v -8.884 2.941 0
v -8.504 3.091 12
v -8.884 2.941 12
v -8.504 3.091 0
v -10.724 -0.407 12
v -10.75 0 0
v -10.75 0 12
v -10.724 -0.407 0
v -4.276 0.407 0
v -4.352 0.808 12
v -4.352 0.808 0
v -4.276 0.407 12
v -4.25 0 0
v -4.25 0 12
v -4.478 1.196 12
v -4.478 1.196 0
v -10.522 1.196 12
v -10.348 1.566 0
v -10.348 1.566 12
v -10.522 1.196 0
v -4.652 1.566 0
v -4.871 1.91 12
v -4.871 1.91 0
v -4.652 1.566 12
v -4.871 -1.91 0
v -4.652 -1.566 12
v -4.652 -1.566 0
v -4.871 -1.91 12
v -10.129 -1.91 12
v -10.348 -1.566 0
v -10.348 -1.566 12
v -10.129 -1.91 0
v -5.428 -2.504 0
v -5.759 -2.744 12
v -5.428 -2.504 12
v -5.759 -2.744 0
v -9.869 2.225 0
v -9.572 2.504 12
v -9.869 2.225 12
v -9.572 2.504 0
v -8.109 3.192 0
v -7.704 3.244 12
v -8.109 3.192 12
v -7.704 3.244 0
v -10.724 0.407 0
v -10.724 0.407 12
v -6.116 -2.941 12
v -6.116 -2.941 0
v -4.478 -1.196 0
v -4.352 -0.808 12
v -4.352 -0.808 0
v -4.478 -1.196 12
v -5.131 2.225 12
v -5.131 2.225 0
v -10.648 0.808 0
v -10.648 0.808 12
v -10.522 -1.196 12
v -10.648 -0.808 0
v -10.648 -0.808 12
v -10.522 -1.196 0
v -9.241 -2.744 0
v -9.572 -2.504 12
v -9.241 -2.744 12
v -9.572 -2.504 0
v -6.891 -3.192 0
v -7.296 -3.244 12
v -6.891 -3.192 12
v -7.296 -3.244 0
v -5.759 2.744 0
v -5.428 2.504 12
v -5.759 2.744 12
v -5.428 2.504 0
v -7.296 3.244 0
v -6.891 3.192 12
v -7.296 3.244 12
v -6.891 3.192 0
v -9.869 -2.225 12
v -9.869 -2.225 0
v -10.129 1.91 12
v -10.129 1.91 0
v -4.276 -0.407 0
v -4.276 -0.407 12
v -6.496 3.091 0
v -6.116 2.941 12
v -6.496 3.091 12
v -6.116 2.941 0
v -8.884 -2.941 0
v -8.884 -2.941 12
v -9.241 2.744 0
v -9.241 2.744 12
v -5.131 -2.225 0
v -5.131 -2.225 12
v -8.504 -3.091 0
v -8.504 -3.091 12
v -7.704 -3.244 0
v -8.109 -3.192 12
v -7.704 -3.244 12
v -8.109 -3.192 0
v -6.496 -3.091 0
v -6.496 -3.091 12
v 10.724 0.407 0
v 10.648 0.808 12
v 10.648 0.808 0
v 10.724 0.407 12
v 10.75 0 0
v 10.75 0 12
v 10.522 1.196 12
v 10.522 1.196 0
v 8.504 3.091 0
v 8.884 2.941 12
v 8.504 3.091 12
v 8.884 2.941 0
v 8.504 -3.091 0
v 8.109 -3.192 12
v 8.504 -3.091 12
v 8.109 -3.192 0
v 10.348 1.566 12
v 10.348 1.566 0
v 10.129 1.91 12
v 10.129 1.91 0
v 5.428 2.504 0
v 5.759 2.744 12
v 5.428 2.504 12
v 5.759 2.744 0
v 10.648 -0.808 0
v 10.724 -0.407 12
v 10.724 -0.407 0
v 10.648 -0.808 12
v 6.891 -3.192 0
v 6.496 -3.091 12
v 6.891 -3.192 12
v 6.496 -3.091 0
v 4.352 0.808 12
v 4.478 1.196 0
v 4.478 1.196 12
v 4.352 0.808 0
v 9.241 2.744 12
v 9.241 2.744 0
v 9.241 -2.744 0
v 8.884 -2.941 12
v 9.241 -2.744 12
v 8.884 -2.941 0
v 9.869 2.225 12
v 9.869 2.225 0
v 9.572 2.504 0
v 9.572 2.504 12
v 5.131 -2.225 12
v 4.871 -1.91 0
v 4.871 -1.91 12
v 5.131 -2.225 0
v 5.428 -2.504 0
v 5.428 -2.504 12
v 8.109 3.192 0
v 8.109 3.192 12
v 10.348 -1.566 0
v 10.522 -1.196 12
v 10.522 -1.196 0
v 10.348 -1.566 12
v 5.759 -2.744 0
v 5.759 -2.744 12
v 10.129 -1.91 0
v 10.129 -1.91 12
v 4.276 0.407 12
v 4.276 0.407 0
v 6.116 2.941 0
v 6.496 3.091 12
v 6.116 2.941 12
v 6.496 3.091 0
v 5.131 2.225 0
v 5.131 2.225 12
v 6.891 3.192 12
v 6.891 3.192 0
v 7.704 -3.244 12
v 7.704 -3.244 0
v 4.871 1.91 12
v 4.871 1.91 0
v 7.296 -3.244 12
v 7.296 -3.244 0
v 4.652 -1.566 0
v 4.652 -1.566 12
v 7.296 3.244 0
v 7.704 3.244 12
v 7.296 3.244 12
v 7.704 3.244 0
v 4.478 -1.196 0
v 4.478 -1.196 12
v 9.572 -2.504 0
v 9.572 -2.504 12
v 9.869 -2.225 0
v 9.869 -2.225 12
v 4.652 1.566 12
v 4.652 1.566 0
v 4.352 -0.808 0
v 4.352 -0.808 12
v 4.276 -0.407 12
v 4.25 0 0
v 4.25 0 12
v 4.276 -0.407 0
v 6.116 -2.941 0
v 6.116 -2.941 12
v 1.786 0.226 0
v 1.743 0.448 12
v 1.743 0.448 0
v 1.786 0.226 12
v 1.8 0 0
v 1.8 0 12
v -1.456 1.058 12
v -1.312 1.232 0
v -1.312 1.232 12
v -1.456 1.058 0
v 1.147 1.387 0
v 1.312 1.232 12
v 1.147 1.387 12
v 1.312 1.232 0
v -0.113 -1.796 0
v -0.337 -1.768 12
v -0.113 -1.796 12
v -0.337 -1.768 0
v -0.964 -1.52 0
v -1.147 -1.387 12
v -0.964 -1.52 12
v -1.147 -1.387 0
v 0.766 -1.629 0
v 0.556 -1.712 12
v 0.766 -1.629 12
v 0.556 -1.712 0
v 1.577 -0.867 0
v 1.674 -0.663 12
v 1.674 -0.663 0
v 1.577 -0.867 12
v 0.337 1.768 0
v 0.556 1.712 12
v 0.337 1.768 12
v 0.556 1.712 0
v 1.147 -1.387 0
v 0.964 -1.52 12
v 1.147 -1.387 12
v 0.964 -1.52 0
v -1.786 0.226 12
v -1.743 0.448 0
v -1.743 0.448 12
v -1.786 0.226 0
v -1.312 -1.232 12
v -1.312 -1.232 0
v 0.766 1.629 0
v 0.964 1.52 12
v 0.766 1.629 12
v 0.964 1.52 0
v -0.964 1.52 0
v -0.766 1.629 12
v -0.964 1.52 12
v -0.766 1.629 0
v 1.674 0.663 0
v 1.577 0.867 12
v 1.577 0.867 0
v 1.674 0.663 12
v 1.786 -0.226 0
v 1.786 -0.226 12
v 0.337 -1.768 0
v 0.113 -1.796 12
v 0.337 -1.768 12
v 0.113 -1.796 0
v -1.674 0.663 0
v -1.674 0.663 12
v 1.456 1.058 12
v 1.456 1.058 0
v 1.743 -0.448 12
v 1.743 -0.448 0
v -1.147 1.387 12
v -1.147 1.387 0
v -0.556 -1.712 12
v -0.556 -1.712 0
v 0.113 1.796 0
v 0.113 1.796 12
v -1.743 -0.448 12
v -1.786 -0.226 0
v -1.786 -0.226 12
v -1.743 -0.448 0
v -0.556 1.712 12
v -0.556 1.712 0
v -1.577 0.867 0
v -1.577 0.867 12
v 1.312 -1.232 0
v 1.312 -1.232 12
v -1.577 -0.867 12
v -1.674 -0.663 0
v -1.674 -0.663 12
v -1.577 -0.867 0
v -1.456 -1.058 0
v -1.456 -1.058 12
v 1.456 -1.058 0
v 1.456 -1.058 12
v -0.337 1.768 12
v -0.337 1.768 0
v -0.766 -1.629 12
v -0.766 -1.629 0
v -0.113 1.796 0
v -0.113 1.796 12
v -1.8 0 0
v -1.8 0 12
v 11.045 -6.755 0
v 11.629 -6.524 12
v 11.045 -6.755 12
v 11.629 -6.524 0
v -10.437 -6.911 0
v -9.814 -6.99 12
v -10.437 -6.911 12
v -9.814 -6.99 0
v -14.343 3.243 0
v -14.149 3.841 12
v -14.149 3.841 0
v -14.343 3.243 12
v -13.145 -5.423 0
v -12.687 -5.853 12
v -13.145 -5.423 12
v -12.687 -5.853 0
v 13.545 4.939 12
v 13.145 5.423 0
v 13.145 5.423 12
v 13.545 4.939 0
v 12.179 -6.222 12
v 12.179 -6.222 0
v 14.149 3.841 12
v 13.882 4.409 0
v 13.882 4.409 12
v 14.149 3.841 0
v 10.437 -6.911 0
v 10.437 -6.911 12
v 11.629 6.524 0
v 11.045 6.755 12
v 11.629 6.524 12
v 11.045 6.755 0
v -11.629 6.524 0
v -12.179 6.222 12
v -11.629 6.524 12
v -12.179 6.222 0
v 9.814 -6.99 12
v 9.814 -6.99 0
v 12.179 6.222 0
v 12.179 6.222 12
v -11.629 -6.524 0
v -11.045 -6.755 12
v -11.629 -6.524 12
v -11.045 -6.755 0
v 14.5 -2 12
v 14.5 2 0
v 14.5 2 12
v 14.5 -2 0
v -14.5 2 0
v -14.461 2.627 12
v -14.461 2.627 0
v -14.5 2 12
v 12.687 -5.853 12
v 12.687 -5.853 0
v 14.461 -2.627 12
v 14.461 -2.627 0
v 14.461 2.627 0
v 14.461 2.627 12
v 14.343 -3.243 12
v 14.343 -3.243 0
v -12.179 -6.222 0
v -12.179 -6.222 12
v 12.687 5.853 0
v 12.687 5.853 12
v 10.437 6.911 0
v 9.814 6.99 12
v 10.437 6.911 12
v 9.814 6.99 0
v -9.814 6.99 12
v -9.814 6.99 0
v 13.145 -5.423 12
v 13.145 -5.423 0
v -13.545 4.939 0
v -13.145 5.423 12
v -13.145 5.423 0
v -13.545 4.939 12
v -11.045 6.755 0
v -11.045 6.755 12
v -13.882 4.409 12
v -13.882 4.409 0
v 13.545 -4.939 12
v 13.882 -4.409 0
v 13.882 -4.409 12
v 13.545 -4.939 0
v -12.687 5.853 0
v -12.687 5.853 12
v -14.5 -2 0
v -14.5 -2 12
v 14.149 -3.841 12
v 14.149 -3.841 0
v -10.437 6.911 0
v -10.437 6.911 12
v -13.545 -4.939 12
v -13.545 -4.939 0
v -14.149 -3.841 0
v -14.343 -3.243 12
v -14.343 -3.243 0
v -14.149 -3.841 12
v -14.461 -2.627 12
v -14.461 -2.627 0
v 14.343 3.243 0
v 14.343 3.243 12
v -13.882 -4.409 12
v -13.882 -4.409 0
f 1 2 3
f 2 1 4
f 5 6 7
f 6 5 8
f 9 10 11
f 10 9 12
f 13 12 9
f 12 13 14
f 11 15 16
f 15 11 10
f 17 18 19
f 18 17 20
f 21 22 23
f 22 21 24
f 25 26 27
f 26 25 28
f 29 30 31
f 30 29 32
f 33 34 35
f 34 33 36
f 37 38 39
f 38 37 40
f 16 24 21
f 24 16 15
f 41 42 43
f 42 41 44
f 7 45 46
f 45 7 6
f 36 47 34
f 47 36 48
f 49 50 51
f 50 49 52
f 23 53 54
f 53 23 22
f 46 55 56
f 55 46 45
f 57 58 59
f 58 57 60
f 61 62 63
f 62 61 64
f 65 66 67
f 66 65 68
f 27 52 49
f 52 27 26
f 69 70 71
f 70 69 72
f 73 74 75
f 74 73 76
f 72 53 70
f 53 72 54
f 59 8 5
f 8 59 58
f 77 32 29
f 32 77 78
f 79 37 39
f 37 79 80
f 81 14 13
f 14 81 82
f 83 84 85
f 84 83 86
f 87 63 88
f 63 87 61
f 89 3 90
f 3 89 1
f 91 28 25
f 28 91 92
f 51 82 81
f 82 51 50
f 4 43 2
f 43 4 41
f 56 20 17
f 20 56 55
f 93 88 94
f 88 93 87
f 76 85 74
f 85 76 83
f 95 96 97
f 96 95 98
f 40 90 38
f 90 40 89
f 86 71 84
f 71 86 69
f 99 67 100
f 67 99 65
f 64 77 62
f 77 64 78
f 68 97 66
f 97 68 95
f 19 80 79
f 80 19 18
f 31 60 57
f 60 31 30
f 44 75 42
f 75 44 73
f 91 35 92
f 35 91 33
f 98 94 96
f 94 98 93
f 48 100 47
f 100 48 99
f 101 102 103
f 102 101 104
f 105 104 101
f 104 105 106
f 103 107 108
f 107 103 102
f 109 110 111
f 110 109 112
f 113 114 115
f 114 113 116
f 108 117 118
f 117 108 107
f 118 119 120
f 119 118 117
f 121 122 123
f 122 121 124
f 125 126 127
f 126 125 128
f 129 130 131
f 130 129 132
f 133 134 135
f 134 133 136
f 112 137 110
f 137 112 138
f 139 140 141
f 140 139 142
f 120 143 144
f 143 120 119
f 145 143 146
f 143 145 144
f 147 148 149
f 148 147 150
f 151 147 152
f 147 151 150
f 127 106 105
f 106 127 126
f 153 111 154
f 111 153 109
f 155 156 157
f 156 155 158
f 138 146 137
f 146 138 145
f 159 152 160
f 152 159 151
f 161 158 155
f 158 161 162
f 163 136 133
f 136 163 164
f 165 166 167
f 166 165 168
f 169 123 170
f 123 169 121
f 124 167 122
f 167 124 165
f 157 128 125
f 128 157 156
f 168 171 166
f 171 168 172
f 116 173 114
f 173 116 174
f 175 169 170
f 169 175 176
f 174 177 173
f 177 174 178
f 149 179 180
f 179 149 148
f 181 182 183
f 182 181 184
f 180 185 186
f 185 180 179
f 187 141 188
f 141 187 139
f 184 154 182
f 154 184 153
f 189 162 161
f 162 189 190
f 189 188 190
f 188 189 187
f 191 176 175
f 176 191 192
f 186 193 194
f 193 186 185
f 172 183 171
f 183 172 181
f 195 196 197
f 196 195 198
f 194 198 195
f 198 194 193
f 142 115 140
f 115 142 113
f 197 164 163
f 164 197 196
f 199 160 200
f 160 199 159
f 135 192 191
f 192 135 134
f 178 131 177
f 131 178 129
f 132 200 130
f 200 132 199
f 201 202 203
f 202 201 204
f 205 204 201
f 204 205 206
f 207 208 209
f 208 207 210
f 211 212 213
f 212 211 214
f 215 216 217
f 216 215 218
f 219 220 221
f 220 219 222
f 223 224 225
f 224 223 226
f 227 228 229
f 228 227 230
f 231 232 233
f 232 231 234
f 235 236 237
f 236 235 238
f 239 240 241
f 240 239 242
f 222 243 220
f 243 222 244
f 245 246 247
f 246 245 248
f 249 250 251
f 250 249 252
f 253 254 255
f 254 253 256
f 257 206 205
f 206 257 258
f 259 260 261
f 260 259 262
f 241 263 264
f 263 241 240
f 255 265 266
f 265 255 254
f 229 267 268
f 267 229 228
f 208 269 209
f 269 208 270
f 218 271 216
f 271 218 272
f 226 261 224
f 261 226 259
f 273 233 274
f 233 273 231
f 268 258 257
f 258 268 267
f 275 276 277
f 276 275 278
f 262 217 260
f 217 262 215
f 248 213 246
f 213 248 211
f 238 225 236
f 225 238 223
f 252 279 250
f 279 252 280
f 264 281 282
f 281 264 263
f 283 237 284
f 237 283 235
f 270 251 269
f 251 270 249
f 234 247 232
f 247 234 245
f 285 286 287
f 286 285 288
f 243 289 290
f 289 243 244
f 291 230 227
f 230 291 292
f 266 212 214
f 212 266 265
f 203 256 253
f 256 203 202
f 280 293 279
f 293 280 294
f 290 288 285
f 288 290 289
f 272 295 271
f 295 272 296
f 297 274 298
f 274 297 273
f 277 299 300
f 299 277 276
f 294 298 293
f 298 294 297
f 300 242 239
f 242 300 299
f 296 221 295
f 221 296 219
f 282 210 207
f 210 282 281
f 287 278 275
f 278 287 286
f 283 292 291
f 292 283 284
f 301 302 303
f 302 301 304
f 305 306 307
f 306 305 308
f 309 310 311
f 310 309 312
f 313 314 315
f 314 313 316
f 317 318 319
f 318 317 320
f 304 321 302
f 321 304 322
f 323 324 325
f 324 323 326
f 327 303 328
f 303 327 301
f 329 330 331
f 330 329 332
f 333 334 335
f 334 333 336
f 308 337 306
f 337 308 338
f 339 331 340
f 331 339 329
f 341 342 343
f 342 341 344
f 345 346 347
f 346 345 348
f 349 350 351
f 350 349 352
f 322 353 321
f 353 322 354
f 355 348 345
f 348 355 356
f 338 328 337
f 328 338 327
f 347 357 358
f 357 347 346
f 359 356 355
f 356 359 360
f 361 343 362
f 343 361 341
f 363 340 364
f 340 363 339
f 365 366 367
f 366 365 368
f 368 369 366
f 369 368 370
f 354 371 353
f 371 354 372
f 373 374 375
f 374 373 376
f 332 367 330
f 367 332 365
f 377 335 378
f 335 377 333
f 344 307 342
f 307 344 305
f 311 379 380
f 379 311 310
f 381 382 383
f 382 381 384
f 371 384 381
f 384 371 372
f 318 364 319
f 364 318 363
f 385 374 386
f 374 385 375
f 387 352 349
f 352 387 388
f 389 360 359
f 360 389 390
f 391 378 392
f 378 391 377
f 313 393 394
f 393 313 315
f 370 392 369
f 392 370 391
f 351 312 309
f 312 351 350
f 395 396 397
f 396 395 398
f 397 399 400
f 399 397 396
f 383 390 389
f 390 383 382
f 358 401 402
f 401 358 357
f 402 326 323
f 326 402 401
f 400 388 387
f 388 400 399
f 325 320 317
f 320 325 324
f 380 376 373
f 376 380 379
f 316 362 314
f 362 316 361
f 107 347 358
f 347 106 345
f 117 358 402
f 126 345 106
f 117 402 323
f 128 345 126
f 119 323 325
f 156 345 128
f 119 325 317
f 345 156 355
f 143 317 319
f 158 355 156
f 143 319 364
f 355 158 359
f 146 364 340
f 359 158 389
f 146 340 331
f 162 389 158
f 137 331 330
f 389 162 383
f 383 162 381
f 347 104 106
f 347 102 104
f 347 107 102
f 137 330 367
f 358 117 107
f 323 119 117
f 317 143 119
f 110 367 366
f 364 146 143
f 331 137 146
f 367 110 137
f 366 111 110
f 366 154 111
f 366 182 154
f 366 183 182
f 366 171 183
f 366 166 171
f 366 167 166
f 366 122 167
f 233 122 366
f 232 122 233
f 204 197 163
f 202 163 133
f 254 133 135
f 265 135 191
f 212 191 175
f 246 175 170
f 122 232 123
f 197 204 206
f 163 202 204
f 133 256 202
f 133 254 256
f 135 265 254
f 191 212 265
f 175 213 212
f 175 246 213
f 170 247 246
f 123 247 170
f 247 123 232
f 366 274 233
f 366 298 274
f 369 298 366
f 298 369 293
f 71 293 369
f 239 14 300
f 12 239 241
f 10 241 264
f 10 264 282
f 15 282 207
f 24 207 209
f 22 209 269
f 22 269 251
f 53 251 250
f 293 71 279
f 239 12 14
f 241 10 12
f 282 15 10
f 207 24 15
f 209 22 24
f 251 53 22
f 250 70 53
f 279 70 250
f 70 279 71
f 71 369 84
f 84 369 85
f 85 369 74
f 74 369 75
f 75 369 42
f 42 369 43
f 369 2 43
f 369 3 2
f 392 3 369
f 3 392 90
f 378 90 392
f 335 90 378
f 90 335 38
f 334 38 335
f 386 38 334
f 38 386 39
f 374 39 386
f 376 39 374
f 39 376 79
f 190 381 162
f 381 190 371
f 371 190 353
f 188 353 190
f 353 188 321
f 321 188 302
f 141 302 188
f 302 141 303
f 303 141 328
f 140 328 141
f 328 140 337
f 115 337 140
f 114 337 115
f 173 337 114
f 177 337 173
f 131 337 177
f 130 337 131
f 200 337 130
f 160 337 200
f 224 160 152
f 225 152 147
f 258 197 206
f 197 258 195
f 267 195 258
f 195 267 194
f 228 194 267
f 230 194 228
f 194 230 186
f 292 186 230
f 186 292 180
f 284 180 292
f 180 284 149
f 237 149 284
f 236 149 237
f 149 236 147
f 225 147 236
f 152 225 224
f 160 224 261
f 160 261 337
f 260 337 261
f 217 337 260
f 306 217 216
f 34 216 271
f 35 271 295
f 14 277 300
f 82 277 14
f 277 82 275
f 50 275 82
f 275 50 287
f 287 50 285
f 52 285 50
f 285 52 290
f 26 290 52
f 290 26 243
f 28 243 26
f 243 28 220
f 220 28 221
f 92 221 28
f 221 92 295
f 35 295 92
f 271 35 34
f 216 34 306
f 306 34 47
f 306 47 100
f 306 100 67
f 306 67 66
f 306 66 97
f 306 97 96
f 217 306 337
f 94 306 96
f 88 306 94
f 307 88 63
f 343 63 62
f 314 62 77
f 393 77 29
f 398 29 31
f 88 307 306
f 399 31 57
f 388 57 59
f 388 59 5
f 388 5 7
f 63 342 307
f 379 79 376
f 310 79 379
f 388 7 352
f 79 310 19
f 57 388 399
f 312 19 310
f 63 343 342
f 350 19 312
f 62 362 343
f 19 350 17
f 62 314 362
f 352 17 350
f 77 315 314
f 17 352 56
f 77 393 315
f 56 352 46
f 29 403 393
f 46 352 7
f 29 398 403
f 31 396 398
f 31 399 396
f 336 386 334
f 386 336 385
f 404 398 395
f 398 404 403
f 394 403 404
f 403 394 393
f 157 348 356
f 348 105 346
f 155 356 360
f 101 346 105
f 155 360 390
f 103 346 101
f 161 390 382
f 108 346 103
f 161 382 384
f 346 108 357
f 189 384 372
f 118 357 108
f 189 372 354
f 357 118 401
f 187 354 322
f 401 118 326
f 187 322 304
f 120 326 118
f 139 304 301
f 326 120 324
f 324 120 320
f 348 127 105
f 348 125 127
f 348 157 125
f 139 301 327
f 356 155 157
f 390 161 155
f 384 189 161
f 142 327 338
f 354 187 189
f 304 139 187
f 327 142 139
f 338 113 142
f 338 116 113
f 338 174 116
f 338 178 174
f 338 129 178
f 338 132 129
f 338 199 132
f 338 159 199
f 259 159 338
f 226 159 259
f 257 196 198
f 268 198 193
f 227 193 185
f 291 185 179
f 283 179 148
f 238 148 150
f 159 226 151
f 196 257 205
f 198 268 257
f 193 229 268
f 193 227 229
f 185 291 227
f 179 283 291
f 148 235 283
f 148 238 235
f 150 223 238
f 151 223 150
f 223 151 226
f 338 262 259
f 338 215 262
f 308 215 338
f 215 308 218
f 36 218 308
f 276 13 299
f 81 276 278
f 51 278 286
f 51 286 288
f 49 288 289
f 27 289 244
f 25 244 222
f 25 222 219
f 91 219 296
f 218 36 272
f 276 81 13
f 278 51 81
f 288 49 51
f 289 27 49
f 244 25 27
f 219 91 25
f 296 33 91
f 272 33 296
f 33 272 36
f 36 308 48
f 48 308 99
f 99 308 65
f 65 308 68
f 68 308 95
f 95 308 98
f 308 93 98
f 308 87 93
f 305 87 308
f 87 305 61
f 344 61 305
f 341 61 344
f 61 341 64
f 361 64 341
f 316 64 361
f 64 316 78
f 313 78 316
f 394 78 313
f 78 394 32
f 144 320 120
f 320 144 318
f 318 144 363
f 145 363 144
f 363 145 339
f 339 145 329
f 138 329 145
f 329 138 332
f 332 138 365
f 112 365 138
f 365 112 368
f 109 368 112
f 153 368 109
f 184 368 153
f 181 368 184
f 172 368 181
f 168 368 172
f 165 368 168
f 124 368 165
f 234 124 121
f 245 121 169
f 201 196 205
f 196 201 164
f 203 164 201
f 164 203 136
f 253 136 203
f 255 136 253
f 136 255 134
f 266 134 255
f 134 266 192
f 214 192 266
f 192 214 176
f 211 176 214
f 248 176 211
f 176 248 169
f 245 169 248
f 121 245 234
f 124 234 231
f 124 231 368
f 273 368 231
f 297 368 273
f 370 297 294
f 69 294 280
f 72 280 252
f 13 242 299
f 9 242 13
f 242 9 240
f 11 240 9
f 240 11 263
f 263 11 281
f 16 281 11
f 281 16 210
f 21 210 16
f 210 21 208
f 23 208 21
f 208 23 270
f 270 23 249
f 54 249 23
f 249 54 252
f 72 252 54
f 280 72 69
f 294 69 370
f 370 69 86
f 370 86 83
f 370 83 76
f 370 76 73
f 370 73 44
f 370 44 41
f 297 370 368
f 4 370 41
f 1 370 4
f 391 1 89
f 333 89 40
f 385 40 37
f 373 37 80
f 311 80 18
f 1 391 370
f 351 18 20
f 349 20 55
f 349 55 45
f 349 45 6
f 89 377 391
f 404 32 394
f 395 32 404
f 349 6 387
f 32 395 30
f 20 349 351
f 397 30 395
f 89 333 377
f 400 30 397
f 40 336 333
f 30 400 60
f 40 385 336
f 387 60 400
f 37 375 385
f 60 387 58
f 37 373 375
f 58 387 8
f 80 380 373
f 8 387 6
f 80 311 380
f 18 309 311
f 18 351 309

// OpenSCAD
$fn = 50;


difference() {
	union() {
		hull() {
			translate(v = [-9.5000000000, 2.0000000000, 0]) {
				cylinder(h = 12, r = 5);
			}
			translate(v = [9.5000000000, 2.0000000000, 0]) {
				cylinder(h = 12, r = 5);
			}
			translate(v = [-9.5000000000, -2.0000000000, 0]) {
				cylinder(h = 12, r = 5);
			}
			translate(v = [9.5000000000, -2.0000000000, 0]) {
				cylinder(h = 12, r = 5);
			}
		}
	}
	union() {
		translate(v = [-7.5000000000, 0.0000000000, 0]) {
			translate(v = [0, 0, -100]) {
				cylinder(h = 200, r = 3.2500000000);
			}
		}
		translate(v = [7.5000000000, 0.0000000000, 0]) {
			translate(v = [0, 0, -100]) {
				cylinder(h = 200, r = 3.2500000000);
			}
		}
		translate(v = [-7.5000000000, 0.0000000000, 0]) {
			translate(v = [0, 0, -100]) {
				cylinder(h = 200, r = 1.8000000000);
			}
		}
		translate(v = [0, 0, -100]) {
			cylinder(h = 200, r = 1.8000000000);
		}
		translate(v = [7.5000000000, 0.0000000000, 0]) {
			translate(v = [0, 0, -100]) {
				cylinder(h = 200, r = 1.8000000000);
			}
		}
	}
}
